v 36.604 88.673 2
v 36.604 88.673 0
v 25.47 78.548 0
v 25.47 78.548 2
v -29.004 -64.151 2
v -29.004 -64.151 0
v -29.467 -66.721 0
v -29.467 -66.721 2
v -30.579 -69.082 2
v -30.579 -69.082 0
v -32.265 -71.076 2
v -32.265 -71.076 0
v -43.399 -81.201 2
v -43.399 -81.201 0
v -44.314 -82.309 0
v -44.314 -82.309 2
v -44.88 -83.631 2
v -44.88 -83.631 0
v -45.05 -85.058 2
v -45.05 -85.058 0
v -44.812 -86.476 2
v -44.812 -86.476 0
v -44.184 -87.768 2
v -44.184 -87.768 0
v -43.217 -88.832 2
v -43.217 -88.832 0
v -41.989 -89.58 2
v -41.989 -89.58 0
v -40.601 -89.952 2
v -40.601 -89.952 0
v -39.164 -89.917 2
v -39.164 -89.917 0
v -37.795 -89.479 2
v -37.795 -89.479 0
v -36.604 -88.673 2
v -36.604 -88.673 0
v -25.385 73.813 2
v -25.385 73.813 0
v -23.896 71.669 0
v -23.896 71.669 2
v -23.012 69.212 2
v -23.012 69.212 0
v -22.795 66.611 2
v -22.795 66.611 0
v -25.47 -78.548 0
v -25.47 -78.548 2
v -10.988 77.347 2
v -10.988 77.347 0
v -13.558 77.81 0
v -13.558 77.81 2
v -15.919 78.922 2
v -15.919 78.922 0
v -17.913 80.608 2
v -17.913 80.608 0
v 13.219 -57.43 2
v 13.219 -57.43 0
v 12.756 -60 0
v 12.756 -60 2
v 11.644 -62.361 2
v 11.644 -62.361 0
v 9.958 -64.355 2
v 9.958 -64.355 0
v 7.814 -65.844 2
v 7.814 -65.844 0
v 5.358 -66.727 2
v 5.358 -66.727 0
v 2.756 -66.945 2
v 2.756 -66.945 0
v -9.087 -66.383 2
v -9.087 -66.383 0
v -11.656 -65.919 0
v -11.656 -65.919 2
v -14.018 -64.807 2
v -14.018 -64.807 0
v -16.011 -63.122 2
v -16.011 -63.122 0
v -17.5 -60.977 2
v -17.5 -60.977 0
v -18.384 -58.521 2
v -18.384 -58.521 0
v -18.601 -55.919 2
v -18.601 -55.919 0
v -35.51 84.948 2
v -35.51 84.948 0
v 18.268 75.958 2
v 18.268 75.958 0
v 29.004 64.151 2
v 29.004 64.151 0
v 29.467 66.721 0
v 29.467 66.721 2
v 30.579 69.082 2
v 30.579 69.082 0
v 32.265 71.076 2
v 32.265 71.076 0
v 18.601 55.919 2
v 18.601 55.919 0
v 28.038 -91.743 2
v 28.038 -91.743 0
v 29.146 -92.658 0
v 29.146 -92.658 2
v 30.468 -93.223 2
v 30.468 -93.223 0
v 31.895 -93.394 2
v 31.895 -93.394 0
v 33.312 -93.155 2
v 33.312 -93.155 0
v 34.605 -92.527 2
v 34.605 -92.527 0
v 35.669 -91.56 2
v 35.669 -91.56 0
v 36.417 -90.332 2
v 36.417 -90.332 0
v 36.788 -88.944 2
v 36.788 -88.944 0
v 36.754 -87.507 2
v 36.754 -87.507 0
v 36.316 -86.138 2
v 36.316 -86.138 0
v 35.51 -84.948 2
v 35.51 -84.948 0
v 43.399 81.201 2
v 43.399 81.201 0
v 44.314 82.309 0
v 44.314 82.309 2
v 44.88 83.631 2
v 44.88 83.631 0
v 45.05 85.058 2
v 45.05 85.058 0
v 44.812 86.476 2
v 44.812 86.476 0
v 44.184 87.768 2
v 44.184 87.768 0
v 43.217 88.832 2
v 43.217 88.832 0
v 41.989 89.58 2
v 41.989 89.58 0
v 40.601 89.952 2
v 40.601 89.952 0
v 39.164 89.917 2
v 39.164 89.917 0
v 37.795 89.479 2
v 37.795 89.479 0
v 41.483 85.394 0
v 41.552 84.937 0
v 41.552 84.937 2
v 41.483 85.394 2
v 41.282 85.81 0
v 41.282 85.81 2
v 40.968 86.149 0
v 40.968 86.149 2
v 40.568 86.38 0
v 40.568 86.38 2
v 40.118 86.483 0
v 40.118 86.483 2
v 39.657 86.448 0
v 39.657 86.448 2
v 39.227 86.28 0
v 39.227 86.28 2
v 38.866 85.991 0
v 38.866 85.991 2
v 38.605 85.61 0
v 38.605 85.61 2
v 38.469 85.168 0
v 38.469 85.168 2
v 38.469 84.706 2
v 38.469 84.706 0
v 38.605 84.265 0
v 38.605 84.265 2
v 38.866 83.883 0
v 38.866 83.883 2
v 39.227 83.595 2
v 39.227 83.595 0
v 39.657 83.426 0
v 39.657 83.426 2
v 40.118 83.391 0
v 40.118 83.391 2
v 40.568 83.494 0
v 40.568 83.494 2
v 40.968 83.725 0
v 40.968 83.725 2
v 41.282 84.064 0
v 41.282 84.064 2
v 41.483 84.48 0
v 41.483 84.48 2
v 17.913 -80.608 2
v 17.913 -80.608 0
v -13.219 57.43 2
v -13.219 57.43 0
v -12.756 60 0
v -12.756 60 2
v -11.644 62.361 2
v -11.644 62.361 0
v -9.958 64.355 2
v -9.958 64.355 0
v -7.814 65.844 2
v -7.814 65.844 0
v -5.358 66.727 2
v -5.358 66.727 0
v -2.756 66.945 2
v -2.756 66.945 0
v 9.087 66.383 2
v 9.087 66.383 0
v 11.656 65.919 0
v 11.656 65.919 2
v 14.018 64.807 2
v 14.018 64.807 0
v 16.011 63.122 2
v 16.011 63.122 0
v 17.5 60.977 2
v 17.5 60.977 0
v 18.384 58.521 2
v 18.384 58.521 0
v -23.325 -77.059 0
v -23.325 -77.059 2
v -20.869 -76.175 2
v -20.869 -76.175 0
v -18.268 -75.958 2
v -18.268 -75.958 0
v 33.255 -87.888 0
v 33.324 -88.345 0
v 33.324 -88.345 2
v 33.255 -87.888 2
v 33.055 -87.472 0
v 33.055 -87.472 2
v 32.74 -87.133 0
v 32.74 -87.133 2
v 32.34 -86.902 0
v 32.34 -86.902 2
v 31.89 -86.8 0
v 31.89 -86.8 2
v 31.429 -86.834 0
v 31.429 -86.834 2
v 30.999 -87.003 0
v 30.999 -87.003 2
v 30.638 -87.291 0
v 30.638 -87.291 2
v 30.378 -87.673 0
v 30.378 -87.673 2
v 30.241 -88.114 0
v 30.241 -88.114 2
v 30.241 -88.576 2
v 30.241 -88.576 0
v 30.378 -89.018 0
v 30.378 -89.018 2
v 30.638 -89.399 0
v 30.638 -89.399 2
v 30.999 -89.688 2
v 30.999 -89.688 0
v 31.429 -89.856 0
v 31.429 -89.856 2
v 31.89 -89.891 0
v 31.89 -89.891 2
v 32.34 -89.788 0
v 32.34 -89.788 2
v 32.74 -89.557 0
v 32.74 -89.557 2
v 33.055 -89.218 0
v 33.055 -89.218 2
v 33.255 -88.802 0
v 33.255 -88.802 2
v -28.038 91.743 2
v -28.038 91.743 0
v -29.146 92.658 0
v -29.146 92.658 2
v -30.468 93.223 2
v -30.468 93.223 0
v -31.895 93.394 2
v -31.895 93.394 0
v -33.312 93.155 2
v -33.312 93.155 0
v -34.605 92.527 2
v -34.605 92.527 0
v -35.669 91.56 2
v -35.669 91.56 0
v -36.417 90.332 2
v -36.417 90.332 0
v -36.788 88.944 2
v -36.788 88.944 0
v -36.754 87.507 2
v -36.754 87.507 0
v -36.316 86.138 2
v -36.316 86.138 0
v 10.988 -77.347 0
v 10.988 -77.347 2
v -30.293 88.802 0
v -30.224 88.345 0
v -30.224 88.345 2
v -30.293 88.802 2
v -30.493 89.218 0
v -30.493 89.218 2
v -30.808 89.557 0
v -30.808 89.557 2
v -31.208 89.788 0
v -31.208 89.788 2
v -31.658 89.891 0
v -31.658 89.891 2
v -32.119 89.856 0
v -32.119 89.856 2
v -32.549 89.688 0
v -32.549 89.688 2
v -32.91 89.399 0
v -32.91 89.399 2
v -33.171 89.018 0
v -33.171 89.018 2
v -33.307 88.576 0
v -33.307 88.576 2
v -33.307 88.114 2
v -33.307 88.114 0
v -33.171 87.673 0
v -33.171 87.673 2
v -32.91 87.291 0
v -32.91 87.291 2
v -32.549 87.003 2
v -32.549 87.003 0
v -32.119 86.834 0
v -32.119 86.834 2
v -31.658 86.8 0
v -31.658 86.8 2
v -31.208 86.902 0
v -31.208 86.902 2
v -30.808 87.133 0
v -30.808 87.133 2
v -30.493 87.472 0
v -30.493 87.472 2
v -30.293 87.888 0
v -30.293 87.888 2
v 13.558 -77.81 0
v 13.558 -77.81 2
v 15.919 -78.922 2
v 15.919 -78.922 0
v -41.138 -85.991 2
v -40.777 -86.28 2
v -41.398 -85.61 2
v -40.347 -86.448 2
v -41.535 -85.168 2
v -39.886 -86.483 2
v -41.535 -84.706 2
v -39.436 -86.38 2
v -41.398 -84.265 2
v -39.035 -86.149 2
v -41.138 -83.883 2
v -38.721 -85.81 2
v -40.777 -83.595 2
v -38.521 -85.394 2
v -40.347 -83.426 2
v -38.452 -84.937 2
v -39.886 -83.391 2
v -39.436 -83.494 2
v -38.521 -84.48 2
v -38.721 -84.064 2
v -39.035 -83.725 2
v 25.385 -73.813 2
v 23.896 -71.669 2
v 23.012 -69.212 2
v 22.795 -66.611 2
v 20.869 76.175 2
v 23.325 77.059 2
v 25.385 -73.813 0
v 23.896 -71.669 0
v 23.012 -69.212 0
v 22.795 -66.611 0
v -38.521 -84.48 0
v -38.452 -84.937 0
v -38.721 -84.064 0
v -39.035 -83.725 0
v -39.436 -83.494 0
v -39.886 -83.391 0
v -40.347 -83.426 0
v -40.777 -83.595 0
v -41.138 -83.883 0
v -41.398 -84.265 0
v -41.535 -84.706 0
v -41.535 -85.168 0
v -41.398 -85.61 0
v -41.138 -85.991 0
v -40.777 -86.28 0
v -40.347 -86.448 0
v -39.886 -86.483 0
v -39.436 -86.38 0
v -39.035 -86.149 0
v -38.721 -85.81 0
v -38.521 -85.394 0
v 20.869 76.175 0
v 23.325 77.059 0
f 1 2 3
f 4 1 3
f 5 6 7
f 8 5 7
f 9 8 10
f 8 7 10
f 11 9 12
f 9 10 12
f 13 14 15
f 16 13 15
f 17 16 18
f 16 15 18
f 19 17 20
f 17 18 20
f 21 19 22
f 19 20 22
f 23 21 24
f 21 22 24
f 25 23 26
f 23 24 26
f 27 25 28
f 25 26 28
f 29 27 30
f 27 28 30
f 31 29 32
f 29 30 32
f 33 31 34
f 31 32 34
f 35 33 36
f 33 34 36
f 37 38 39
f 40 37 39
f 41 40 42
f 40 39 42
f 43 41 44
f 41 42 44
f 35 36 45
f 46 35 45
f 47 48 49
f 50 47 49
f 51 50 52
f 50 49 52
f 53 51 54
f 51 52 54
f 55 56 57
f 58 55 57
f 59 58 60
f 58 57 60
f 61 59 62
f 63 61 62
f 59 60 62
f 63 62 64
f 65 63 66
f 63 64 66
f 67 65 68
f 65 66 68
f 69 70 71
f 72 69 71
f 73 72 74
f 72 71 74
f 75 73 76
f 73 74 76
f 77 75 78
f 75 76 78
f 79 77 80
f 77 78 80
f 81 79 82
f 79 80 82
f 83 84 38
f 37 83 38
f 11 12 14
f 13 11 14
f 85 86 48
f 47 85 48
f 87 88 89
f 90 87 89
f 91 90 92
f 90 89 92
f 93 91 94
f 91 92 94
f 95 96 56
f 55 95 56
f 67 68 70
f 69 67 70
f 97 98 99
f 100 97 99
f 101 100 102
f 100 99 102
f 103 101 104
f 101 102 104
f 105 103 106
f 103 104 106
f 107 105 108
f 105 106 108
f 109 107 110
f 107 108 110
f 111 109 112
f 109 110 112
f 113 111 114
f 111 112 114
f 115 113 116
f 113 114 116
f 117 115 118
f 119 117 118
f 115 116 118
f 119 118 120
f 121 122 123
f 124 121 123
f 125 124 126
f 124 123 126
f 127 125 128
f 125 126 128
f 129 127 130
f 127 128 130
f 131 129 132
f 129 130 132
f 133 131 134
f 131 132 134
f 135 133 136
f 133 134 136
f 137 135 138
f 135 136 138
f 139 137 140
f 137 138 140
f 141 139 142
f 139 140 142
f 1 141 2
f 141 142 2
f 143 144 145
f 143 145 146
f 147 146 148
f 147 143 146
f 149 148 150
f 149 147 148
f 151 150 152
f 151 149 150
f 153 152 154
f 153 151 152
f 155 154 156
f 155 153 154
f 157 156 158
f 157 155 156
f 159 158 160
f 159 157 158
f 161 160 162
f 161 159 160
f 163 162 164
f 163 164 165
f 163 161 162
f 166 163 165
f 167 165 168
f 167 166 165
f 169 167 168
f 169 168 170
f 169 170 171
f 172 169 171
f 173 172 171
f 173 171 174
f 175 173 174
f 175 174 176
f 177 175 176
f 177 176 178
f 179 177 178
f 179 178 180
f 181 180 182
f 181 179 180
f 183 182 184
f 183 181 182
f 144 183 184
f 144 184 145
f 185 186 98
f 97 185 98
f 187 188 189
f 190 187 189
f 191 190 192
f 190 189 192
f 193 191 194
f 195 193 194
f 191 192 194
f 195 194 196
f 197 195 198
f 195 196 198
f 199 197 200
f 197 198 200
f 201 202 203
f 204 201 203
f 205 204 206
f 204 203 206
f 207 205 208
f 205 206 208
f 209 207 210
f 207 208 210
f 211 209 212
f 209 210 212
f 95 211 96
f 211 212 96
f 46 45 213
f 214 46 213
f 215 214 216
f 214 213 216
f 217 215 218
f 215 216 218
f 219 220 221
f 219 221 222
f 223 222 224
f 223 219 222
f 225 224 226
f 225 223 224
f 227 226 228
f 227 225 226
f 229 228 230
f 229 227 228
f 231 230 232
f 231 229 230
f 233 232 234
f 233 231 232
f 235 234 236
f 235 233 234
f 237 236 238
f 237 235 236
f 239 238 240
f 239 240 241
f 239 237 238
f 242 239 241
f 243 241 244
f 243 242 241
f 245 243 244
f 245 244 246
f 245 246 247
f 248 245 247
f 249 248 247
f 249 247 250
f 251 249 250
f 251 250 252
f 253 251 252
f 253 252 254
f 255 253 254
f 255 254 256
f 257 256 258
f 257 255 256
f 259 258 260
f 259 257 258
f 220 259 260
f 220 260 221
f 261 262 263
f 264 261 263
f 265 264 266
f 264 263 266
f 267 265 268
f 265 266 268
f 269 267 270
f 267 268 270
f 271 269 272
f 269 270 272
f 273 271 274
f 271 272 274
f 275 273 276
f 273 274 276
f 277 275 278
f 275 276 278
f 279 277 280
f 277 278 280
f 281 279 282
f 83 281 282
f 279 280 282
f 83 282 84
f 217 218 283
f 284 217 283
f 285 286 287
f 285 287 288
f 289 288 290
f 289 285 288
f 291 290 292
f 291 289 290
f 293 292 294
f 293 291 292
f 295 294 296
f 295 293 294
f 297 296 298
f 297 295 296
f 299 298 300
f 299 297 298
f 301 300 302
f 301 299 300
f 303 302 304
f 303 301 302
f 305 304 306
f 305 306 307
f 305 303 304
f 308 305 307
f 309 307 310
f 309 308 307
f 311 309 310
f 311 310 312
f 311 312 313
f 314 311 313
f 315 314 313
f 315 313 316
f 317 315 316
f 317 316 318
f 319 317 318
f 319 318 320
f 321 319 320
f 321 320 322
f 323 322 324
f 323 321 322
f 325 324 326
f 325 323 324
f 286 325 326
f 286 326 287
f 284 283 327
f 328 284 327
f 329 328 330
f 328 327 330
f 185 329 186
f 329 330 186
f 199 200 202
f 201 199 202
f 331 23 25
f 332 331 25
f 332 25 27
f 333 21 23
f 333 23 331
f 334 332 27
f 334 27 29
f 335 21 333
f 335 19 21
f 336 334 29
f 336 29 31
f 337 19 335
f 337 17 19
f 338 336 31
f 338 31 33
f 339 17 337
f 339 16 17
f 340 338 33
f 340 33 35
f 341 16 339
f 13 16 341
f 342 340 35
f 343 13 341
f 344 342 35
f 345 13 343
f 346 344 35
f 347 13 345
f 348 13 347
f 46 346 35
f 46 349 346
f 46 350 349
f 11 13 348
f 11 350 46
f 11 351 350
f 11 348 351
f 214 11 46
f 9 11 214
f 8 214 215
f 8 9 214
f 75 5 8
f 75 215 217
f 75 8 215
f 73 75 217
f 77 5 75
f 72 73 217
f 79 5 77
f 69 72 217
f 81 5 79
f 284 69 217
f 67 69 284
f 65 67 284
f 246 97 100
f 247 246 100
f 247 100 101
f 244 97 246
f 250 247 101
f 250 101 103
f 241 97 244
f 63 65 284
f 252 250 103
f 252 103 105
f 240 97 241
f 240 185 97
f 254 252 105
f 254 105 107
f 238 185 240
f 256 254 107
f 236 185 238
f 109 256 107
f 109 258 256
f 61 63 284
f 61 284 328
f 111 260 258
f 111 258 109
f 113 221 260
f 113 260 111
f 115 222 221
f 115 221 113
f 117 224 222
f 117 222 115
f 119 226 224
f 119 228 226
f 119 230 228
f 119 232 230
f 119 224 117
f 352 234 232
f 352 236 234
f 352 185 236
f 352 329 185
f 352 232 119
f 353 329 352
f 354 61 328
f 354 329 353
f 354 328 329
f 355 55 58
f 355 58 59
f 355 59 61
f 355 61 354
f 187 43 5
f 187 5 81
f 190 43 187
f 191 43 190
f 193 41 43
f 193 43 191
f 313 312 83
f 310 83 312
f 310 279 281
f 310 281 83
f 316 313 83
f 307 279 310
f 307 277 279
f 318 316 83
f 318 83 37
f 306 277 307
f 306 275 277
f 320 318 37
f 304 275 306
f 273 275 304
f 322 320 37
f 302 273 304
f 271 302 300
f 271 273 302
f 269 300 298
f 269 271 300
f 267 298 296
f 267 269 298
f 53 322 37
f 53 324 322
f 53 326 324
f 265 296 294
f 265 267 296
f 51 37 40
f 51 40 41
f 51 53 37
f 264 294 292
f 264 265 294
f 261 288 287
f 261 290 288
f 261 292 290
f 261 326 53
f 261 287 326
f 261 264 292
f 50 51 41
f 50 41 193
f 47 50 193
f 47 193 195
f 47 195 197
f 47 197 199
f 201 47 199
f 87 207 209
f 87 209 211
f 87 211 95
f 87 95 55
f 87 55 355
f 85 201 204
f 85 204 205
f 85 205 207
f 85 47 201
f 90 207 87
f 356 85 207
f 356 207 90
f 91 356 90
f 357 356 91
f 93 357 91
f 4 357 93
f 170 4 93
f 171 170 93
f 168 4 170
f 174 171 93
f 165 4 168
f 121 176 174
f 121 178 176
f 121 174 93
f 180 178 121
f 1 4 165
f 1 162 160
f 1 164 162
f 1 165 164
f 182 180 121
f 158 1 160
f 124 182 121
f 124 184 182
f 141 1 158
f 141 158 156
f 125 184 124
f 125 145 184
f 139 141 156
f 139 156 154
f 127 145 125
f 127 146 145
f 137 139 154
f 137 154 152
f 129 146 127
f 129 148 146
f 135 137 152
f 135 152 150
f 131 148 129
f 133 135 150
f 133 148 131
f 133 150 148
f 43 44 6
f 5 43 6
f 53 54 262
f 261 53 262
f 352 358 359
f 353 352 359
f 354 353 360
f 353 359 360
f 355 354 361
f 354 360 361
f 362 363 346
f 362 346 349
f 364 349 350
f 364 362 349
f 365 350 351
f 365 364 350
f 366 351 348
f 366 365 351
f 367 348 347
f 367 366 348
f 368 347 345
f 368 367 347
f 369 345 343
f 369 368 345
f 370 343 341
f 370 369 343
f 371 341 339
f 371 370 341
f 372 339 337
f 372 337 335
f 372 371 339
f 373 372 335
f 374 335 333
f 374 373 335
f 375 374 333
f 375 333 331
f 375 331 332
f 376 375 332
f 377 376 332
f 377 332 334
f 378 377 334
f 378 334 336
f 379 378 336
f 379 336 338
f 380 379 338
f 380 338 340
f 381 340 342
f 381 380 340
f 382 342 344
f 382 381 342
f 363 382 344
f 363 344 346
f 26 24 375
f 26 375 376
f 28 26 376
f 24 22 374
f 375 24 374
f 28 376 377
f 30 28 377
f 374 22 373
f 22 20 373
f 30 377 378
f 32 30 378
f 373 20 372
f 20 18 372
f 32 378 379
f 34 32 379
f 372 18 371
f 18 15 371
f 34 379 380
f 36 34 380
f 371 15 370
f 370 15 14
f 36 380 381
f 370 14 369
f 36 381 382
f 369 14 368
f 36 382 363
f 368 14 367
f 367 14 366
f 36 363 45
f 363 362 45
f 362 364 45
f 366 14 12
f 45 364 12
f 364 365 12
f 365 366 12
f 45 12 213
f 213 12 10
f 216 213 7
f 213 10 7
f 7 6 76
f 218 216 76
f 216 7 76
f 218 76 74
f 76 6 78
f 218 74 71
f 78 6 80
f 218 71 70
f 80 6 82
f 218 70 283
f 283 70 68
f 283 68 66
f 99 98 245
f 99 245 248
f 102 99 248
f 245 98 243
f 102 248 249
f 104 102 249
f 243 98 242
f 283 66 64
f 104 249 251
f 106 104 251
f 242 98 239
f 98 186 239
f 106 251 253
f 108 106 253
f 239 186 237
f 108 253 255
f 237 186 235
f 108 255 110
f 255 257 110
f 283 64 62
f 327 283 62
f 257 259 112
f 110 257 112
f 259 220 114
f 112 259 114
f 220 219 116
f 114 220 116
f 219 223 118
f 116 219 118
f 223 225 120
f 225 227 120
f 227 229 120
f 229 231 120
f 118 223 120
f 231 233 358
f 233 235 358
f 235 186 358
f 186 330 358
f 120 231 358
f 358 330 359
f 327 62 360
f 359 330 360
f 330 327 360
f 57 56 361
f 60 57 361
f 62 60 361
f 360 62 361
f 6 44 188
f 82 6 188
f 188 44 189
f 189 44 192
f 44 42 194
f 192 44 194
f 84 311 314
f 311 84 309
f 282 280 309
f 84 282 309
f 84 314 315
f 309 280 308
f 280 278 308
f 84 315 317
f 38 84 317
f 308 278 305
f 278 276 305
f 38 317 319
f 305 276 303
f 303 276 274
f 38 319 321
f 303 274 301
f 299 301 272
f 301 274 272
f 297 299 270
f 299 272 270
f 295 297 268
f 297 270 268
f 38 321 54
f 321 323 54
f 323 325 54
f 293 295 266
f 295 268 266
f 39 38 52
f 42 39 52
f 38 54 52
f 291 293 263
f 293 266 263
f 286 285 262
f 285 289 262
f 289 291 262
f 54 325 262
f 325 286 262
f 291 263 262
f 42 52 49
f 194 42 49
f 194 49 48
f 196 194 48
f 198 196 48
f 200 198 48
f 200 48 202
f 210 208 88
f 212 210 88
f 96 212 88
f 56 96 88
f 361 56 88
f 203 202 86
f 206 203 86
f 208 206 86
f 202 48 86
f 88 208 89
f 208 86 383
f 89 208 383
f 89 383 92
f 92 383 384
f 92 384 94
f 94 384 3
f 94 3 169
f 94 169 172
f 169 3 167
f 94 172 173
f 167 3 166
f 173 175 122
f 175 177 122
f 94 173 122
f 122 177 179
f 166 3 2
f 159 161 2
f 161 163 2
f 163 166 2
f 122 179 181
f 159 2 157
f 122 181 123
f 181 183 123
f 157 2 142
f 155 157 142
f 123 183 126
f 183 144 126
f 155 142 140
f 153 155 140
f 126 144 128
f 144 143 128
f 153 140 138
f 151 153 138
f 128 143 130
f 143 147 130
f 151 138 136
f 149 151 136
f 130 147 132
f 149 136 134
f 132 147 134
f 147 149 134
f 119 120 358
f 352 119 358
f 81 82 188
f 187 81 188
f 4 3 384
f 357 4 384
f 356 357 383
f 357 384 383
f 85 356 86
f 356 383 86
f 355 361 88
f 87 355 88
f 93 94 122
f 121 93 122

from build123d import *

# Parameters (mm, degrees)
SKETCH1_R           = 1.55
BOSS_EXTRUDE1_DEPTH = 2


with BuildPart() as part:
    # Sketch1 → Boss-Extrude1 (new body)
    with BuildSketch(Plane.XY):
        with BuildLine():
            ThreePointArc((25.385066163, -73.812983116), (23.373646331, -70.469589068), (22.794798226, -66.610958693))
            Line((22.794798226, -66.610958693), (29.003615503, 64.151484254))
            ThreePointArc((29.003615503, 64.151484254), (29.945463503, 67.93790946), (32.264619787, 71.075680584))
            Line((32.264619787, 71.075680584), (43.399330006, 81.200932599))
            ThreePointArc((43.399330006, 81.200932599), (43.738051861, 88.334674079), (36.604310381, 88.673395935))
            Line((36.604310381, 88.673395935), (25.469600163, 78.54814392))
            ThreePointArc((25.469600163, 78.54814392), (22.126206115, 76.536724088), (18.267575741, 75.957875984))
            Line((18.267575741, 75.957875984), (-10.988406497, 77.346998456))
            ThreePointArc((-10.988406497, 77.346998456), (-14.774831703, 78.288846456), (-17.912602827, 80.60800274))
            Line((-17.912602827, 80.60800274), (-28.037854841, 91.742712958))
            ThreePointArc((-28.037854841, 91.742712958), (-35.171596321, 92.081434814), (-35.510318177, 84.947693334))
            Line((-35.510318177, 84.947693334), (-25.385066163, 73.812983116))
            ThreePointArc((-25.385066163, 73.812983116), (-23.373646331, 70.469589068), (-22.794798226, 66.610958693))
            Line((-22.794798226, 66.610958693), (-29.003615503, -64.151484254))
            ThreePointArc((-29.003615503, -64.151484254), (-29.945463503, -67.93790946), (-32.264619787, -71.075680584))
            Line((-32.264619787, -71.075680584), (-43.399330005, -81.200932599))
            ThreePointArc((-43.399330005, -81.200932599), (-43.738051861, -88.334674079), (-36.604310381, -88.673395935))
            Line((-36.604310381, -88.673395935), (-25.469600163, -78.54814392))
            ThreePointArc((-25.469600163, -78.54814392), (-22.126206115, -76.536724088), (-18.26757574, -75.957875984))
            Line((-18.26757574, -75.957875984), (10.988406497, -77.346998456))
            ThreePointArc((10.988406497, -77.346998456), (14.774831703, -78.288846456), (17.912602827, -80.60800274))
            Line((17.912602827, -80.60800274), (28.037854841, -91.742712958))
            ThreePointArc((28.037854841, -91.742712958), (35.171596321, -92.081434814), (35.510318177, -84.947693334))
            Line((35.510318177, -84.947693334), (25.385066163, -73.812983116))
        make_face()
        with BuildLine():
            ThreePointArc((-9.087016293, -66.382517954), (-16.011212623, -63.121513669), (-18.601480559, -55.919489247))
            Line((-18.601480559, -55.919489247), (-13.219440196, 57.430399246))
            ThreePointArc((-13.219440196, 57.430399246), (-9.958435912, 64.354595576), (-2.756411489, 66.944863512))
            Line((-2.756411489, 66.944863512), (9.087016293, 66.382517954))
            ThreePointArc((9.087016293, 66.382517954), (16.011212623, 63.121513669), (18.601480559, 55.919489247))
            Line((18.601480559, 55.919489247), (13.219440196, -57.430399246))
            ThreePointArc((13.219440196, -57.430399246), (9.958435912, -64.354595576), (2.756411489, -66.944863512))
            Line((2.756411489, -66.944863512), (-9.087016293, -66.382517954))
        make_face(mode=Mode.SUBTRACT)
        with Locations((31.774086509, -88.345203146)):
            Circle(SKETCH1_R, mode=Mode.SUBTRACT)
        with Locations((-40.001820193, -84.937164267)):
            Circle(SKETCH1_R, mode=Mode.SUBTRACT)
        with Locations((40.001820193, 84.937164267)):
            Circle(SKETCH1_R, mode=Mode.SUBTRACT)
        with Locations((-31.774086509, 88.345203146)):
            Circle(SKETCH1_R, mode=Mode.SUBTRACT)
    extrude(amount=BOSS_EXTRUDE1_DEPTH)


solid = part.part
